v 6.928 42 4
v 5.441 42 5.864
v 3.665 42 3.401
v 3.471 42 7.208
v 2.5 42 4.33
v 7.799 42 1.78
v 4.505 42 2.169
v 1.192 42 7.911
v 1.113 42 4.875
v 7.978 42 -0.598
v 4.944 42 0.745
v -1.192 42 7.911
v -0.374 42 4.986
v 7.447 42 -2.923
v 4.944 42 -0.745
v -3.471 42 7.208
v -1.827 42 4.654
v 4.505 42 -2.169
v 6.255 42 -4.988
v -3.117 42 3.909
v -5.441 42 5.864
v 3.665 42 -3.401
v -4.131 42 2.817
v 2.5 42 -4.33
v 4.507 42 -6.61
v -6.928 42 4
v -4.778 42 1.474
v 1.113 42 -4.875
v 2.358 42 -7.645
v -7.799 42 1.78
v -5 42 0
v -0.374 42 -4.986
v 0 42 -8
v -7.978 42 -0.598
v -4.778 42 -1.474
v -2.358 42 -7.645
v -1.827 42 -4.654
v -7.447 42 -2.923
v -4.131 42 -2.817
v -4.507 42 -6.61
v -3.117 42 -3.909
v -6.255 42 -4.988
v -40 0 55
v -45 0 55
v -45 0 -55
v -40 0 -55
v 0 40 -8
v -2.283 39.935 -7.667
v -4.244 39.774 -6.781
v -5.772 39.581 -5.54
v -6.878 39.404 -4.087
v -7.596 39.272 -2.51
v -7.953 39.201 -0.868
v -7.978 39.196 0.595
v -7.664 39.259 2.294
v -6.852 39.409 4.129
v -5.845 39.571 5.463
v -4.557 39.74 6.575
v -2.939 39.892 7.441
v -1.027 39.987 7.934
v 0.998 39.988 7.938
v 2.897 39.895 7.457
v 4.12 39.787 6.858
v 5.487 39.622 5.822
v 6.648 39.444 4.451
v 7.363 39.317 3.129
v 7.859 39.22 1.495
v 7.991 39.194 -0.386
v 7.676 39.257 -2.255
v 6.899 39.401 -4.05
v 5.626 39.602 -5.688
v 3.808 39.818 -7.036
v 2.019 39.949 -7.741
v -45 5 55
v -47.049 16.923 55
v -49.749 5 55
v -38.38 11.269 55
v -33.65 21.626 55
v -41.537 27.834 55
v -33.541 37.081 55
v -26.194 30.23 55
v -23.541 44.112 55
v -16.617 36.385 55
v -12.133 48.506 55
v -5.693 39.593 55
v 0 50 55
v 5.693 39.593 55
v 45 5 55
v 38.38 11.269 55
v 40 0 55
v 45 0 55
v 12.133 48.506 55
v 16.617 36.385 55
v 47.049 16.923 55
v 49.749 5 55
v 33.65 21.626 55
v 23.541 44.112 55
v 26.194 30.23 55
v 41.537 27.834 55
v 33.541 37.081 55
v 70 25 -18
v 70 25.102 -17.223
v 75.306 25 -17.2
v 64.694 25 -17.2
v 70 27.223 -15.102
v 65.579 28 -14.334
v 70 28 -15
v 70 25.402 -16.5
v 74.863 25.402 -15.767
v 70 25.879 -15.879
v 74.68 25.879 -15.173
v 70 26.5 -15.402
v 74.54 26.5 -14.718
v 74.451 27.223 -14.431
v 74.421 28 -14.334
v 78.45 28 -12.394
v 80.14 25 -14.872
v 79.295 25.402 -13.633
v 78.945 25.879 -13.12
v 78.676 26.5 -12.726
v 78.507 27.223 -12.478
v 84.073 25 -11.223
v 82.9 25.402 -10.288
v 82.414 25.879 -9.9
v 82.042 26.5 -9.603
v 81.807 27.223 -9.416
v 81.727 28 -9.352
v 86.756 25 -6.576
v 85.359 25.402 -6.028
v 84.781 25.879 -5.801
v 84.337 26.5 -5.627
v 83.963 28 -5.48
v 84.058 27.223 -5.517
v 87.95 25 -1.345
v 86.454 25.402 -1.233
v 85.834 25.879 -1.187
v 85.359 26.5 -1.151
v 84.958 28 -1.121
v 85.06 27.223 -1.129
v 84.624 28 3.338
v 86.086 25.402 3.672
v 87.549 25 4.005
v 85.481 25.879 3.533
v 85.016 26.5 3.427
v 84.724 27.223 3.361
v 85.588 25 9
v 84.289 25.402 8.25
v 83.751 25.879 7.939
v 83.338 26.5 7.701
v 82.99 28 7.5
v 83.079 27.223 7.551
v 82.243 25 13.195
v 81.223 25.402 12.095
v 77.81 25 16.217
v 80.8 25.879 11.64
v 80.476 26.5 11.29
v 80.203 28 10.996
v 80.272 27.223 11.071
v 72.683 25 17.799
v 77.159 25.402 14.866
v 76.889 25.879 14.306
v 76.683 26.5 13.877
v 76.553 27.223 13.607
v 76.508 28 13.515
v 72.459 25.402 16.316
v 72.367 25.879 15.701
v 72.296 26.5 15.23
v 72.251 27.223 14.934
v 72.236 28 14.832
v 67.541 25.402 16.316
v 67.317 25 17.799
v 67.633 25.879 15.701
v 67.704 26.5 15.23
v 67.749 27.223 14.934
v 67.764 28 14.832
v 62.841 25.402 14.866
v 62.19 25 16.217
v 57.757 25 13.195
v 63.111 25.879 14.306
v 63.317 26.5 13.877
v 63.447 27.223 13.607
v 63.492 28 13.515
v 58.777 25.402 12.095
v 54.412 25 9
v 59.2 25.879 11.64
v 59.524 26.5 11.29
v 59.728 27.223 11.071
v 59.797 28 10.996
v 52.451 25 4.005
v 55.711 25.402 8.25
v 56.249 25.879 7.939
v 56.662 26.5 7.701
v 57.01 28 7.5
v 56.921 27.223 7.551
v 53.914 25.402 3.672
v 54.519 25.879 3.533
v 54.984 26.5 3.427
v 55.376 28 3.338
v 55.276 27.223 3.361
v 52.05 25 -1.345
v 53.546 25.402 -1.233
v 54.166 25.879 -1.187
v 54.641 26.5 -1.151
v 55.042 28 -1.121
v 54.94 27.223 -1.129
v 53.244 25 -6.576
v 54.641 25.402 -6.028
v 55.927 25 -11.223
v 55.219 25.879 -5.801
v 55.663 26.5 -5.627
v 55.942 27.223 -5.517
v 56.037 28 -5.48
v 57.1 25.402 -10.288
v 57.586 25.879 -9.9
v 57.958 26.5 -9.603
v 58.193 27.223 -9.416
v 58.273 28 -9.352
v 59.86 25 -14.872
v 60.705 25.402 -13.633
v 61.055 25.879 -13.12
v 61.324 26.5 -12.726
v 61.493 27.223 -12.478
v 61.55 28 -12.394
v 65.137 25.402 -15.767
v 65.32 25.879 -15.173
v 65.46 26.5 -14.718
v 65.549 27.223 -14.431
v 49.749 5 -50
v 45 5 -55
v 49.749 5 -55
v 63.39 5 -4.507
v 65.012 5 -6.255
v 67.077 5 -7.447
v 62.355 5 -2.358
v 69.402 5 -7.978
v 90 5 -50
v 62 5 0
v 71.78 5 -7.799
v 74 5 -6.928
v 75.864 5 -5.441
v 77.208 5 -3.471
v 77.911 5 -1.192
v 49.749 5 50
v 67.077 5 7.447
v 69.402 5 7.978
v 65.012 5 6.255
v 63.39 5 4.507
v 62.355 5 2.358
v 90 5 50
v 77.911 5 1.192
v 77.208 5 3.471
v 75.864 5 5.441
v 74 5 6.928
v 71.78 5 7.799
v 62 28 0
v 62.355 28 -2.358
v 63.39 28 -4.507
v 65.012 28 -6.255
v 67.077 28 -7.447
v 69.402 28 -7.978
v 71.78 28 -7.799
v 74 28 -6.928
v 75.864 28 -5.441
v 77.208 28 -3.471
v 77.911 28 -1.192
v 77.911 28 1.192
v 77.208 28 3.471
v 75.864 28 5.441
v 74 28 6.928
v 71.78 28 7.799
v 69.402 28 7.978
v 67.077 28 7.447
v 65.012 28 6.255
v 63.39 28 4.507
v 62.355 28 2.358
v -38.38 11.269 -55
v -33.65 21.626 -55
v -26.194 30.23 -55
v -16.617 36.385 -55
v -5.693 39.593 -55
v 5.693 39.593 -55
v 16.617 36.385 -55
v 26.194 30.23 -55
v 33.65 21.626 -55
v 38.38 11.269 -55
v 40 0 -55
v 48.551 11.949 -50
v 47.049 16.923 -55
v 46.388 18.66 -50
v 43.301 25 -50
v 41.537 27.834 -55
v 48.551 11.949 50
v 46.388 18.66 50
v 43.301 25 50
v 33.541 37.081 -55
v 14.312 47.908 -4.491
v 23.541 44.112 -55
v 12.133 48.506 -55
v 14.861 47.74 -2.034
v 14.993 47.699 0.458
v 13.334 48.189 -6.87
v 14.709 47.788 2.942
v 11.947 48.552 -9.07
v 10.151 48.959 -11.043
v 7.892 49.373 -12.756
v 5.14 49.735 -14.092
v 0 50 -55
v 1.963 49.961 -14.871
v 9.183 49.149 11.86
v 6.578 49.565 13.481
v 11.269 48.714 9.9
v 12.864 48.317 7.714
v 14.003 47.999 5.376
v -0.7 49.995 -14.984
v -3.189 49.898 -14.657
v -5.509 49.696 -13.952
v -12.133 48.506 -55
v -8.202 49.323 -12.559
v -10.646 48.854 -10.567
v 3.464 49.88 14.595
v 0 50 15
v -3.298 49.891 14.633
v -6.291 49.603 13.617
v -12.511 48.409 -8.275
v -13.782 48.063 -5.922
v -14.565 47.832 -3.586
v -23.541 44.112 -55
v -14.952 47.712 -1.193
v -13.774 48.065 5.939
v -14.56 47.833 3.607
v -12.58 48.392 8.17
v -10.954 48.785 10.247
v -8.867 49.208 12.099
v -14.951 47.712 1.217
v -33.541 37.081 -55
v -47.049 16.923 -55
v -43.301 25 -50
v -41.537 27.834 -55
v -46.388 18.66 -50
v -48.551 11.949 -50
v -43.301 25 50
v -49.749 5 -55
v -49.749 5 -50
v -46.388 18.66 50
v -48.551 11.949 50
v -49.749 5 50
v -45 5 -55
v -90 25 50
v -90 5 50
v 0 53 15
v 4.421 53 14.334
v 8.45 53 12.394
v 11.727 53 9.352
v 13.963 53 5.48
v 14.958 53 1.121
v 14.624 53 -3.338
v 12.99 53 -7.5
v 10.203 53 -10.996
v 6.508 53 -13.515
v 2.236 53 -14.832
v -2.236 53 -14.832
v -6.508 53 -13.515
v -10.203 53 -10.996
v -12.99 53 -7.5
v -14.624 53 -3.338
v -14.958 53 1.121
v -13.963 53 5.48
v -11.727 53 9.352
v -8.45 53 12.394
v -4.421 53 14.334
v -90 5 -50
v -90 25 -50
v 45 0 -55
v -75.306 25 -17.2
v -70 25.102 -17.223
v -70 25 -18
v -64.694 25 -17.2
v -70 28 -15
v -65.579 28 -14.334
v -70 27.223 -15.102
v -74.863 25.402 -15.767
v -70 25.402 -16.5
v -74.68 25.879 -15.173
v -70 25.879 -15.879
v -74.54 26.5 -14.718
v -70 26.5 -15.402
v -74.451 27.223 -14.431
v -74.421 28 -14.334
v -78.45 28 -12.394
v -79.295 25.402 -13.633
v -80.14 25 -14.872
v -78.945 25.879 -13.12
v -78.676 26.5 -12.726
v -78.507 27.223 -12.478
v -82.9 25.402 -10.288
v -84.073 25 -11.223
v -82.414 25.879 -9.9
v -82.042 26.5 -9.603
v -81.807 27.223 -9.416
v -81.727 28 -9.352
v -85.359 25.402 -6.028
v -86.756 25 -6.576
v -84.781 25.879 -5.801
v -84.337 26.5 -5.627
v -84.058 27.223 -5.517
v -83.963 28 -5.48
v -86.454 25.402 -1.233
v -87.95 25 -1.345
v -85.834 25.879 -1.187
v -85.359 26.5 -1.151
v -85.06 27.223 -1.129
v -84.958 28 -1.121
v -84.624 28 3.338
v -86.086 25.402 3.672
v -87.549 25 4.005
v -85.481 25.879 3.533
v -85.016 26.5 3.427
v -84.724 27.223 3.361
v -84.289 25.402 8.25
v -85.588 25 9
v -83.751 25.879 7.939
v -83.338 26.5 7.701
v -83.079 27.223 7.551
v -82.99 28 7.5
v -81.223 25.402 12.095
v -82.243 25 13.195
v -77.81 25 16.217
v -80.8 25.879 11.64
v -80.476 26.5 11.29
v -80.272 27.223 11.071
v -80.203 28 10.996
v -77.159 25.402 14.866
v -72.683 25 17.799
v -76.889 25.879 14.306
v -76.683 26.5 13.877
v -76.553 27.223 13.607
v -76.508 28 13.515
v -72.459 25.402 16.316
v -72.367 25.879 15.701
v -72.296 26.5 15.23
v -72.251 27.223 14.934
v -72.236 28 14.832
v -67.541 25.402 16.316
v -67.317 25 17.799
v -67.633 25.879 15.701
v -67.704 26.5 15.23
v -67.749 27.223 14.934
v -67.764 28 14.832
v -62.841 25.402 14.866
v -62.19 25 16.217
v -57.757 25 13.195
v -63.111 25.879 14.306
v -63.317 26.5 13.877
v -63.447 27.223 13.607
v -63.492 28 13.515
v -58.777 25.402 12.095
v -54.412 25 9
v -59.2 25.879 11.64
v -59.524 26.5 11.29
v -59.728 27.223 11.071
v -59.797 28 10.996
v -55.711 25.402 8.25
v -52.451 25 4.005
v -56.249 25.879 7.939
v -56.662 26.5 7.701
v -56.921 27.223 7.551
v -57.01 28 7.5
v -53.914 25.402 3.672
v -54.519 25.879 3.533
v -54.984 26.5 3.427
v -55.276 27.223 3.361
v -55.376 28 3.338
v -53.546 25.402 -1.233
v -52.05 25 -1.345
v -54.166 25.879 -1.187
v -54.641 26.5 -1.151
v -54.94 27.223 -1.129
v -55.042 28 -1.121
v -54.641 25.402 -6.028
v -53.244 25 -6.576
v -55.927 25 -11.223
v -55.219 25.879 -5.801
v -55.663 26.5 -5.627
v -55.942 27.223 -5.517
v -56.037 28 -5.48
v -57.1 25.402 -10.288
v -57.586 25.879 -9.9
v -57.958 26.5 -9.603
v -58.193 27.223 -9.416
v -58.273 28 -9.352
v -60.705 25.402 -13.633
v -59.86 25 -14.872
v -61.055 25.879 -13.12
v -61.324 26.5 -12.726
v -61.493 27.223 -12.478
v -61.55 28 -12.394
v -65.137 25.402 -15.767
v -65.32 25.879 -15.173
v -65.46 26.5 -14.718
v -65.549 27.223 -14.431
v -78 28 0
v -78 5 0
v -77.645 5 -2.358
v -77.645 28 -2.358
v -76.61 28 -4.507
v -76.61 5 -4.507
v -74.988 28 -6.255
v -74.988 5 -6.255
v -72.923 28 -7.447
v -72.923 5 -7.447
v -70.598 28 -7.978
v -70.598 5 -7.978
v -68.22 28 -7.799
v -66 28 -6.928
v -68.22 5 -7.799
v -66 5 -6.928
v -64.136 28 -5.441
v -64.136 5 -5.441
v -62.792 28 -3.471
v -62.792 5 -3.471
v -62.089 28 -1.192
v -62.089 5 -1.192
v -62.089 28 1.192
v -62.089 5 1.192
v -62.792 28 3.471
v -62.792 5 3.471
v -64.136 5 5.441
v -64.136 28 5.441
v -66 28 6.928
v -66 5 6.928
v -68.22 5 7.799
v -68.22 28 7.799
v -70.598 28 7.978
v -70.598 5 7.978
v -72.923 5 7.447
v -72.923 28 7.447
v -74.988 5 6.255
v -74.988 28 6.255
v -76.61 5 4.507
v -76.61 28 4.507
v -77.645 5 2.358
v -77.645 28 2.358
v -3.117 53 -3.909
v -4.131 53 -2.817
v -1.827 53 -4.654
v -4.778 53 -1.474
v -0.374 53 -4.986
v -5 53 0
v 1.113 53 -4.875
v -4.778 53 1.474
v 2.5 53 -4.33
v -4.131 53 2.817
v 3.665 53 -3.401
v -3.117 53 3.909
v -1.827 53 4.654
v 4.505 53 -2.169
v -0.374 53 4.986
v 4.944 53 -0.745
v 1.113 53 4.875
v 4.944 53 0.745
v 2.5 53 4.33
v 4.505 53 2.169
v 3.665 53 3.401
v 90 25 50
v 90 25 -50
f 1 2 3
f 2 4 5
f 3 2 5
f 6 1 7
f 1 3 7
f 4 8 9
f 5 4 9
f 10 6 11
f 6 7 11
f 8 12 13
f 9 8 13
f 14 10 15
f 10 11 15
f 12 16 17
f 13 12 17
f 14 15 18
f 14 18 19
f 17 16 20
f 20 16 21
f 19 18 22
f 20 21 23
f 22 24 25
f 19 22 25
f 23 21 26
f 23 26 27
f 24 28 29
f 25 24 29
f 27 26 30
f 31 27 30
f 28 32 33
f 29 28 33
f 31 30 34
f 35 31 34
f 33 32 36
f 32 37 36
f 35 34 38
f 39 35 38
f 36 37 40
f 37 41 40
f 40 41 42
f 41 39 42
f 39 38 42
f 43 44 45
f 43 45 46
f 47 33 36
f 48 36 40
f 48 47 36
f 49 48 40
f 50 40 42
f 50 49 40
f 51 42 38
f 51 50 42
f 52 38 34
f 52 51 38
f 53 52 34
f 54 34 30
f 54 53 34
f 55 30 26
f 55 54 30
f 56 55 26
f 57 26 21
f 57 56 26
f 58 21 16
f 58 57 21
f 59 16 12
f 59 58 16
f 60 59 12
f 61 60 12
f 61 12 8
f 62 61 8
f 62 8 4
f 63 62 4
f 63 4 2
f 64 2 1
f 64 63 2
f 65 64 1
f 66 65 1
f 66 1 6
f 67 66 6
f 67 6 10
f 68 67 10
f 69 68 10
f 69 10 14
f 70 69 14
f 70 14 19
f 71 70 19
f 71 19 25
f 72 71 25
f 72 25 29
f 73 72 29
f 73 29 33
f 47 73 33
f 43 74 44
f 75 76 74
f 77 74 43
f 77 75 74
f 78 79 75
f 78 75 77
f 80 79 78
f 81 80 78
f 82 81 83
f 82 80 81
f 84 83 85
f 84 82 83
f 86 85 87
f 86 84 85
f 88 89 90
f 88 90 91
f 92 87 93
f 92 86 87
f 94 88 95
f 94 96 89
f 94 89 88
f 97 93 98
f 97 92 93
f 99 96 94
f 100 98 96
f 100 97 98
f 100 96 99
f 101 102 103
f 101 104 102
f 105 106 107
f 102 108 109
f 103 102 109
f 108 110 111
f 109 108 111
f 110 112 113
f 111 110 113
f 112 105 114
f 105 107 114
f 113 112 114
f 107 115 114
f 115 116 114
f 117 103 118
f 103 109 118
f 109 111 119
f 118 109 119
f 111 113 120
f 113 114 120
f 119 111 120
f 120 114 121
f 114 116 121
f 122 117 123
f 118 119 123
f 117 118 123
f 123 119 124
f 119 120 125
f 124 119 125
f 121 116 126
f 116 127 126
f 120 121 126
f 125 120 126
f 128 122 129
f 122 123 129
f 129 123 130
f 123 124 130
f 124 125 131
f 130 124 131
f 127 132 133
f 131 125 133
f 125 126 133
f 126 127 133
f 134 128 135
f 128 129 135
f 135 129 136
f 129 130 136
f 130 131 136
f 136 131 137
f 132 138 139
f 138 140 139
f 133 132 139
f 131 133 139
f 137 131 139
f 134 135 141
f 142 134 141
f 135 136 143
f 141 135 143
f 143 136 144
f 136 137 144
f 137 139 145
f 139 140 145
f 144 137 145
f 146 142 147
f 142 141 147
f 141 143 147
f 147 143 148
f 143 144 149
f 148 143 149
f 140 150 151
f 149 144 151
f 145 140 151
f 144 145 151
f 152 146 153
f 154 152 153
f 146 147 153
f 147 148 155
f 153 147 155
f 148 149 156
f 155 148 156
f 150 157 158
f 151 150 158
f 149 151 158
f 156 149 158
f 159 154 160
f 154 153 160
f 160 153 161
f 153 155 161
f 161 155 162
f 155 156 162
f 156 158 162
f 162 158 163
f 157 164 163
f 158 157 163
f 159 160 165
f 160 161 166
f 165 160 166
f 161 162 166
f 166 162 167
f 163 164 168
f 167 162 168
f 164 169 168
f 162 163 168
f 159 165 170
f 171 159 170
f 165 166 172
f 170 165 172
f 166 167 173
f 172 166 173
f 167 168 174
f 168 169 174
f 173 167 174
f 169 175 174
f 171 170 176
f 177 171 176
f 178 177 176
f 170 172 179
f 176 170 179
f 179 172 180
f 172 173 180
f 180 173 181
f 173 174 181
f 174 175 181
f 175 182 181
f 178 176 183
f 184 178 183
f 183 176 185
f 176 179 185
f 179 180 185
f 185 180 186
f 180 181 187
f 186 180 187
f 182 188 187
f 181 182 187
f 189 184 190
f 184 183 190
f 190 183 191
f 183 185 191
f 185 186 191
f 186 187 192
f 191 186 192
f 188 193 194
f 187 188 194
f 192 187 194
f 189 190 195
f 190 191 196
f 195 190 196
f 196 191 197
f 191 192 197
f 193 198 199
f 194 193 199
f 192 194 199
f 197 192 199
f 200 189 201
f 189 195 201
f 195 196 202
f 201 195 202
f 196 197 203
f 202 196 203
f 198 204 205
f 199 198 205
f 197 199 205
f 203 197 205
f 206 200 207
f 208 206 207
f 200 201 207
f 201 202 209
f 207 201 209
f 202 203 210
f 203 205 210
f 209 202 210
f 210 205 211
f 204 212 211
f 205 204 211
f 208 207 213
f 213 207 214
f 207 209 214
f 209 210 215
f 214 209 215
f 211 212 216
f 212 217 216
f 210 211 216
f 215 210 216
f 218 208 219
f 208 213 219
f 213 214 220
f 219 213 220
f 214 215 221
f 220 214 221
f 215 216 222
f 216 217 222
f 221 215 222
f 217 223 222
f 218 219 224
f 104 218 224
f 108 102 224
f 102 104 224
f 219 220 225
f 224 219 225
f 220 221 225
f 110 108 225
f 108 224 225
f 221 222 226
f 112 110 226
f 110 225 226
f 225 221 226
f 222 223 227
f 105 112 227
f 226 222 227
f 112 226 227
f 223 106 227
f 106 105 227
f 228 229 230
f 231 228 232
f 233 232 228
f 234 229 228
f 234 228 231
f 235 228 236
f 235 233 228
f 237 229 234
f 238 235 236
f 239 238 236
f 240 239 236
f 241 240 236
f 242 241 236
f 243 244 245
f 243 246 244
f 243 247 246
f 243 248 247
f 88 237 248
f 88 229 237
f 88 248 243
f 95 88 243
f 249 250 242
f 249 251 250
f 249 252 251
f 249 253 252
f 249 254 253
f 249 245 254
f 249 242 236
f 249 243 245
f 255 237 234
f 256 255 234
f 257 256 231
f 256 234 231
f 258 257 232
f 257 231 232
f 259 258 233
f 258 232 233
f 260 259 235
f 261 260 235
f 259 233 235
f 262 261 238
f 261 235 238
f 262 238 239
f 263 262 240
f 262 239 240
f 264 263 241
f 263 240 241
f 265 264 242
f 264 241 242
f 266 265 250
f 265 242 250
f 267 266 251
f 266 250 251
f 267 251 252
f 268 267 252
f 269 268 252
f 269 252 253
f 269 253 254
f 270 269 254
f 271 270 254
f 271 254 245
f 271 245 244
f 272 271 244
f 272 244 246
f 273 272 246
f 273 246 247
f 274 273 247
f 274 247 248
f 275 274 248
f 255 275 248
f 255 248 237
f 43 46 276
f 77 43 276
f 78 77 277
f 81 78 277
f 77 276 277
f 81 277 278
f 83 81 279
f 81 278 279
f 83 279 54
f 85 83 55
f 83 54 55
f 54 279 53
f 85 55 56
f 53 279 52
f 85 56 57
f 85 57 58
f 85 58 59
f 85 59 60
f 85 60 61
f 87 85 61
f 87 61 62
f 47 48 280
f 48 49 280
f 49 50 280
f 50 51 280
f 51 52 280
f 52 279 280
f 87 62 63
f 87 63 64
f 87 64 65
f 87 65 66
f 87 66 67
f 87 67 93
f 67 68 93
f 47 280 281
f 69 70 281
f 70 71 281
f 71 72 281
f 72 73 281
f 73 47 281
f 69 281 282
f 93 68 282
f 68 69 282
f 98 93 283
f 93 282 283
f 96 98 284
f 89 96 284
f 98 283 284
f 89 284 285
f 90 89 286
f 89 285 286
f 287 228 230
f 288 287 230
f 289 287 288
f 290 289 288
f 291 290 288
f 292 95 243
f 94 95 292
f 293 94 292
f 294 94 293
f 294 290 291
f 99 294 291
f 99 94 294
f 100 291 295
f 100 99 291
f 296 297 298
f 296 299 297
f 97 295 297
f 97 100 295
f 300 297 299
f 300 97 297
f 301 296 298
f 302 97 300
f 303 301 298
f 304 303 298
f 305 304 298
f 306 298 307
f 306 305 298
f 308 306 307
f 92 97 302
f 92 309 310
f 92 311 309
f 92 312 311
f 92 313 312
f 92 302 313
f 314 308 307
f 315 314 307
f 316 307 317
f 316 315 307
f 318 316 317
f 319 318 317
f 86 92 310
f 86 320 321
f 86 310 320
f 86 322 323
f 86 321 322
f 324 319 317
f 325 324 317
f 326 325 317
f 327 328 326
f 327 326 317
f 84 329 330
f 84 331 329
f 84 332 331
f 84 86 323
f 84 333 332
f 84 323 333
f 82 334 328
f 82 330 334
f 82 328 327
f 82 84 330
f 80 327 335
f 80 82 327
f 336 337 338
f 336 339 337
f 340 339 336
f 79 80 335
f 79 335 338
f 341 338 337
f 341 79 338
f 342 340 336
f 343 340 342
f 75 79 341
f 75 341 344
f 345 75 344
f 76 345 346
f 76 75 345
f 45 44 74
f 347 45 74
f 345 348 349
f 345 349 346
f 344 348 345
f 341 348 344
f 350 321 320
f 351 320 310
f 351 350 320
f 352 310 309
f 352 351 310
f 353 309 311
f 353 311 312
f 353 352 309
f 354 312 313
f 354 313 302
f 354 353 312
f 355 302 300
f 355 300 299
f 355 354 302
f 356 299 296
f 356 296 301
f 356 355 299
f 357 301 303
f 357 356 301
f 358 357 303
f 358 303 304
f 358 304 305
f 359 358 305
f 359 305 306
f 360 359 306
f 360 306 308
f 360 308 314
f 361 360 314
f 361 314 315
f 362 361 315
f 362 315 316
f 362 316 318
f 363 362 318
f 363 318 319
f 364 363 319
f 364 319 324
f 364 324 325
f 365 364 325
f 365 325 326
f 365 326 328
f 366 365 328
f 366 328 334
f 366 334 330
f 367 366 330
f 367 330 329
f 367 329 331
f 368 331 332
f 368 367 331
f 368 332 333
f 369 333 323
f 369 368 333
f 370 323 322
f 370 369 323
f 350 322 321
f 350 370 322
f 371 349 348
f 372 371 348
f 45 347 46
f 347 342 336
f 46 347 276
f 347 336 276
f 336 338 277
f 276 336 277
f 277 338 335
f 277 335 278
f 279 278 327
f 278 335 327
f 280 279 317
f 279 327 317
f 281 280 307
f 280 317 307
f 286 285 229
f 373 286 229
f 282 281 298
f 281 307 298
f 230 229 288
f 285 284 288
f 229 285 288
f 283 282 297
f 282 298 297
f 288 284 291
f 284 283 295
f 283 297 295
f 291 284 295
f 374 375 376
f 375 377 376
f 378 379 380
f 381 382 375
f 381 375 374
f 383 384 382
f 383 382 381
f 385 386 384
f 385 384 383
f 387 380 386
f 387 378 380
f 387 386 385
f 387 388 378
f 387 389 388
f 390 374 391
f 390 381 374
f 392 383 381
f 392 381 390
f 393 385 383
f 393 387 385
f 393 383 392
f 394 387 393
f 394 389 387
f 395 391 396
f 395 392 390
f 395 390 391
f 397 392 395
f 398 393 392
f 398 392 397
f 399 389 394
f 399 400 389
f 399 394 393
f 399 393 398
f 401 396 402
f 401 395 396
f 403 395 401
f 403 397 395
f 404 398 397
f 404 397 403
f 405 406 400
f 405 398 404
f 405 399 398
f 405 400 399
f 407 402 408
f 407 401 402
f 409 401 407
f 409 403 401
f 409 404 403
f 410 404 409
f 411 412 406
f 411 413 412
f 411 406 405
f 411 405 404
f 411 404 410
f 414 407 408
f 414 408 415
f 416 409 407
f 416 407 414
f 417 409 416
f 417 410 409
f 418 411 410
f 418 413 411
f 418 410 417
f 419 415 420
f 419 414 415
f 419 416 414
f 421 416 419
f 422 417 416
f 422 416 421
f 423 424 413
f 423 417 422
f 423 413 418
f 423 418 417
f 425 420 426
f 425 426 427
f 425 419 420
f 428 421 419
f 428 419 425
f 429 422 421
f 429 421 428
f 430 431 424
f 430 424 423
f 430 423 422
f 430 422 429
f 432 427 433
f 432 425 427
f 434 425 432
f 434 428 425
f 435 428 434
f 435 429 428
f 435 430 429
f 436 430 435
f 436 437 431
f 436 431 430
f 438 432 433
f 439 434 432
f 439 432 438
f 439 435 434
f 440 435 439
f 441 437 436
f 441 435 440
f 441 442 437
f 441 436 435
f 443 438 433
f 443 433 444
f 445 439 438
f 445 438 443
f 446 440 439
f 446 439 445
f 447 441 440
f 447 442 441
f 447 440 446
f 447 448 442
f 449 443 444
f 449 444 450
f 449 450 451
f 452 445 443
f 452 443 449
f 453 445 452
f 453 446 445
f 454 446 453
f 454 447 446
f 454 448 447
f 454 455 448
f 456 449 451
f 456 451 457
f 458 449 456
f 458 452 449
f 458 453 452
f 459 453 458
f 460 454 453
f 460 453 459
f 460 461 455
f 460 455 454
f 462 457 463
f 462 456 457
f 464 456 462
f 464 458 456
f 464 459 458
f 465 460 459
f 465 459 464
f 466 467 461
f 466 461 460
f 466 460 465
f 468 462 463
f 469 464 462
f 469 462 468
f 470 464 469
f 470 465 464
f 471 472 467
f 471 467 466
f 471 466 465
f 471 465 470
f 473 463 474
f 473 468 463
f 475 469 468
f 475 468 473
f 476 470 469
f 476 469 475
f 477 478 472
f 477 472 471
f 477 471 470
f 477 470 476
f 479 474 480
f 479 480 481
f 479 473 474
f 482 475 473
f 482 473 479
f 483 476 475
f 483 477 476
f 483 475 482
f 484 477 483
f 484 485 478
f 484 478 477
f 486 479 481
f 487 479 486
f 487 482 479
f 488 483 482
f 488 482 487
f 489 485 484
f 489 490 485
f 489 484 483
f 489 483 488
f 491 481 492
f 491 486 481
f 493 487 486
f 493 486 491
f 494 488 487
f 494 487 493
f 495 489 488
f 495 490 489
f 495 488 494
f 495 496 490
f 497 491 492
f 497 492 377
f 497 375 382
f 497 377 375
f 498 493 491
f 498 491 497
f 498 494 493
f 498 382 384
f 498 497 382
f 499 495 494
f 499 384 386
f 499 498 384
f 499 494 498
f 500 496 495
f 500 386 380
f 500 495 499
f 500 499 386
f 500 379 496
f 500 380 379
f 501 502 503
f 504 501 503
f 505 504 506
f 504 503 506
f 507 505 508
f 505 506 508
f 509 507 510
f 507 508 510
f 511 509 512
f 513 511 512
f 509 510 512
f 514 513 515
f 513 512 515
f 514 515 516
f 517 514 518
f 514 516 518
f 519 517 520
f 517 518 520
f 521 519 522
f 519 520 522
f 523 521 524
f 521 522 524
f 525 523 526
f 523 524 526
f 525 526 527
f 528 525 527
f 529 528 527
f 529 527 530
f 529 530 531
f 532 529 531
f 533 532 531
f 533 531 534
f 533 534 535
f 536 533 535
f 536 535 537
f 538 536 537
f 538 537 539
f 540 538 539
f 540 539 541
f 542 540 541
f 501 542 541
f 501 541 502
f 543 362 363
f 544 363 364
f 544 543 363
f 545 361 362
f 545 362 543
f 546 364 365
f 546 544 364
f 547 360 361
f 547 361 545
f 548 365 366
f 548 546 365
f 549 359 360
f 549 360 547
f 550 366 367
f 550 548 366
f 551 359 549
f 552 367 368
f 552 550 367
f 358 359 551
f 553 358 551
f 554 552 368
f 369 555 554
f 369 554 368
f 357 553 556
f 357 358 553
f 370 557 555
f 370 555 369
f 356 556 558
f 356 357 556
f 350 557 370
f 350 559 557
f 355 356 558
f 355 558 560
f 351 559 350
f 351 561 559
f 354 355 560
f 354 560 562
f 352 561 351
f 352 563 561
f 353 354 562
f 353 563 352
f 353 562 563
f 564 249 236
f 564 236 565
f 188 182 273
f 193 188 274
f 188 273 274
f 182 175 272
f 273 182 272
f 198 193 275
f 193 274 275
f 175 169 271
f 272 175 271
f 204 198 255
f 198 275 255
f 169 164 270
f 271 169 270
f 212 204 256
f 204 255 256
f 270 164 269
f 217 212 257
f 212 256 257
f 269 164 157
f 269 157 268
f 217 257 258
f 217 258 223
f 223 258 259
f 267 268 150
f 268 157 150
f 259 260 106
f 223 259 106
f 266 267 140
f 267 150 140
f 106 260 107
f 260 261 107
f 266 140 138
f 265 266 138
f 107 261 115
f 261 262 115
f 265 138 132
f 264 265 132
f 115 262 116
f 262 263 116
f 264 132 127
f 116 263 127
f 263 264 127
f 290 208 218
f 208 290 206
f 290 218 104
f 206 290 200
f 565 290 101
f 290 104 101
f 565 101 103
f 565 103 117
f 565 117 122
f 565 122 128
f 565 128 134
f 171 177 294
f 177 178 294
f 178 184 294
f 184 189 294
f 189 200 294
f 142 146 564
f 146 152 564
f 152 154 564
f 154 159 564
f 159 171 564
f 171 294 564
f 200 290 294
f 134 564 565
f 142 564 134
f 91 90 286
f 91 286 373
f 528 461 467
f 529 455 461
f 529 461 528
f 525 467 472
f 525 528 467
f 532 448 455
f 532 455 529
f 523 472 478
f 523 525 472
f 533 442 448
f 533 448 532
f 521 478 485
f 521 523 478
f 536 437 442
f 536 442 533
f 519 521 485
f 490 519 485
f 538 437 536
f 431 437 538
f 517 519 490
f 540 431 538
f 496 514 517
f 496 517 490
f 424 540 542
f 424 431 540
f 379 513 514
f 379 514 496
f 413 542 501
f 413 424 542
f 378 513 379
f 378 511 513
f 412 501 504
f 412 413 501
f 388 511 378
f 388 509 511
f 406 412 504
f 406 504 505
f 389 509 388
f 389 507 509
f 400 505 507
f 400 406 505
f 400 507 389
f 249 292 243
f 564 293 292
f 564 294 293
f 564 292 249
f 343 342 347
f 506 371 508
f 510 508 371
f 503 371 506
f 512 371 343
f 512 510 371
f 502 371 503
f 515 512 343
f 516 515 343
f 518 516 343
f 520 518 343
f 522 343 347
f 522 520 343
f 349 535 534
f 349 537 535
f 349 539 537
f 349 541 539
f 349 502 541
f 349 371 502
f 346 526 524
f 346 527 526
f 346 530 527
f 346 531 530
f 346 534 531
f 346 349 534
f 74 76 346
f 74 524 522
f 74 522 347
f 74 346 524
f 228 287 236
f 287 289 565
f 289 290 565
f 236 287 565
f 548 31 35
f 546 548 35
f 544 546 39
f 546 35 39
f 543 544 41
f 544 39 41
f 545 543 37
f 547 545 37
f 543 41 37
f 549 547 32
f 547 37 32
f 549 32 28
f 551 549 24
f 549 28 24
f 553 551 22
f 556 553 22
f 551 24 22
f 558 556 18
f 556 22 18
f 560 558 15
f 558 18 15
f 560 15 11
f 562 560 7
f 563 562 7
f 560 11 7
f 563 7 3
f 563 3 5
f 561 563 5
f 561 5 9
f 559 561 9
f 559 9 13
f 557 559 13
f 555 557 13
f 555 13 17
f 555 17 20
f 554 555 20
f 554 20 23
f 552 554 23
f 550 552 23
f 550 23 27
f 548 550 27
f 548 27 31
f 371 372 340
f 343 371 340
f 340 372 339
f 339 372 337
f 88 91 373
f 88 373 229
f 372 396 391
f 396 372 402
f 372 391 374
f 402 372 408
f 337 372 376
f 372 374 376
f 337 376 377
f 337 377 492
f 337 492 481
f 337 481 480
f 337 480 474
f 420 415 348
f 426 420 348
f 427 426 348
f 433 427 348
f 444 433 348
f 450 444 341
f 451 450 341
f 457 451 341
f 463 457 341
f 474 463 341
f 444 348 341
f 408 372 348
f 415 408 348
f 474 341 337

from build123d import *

# Parameters (mm, degrees)
BOSS_EXTRUDE1_DEPTH      = 55
SKETCH2_W                = 180
SKETCH2_H                = 20
BOSS_EXTRUDE2_DEPTH      = 50
SKETCH3_W                = 5
SKETCH3_H                = 5
CUT_EXTRUDE1_DEPTH       = 151.665191733
CUT_EXTRUDE2_DEPTH       = 151.665191733
CUT_EXTRUDE2_DEPTH_BACK  = 151.665191733
SKETCH5_R                = 15
BOSS_EXTRUDE3_DEPTH      = 3
BOSS_EXTRUDE4_REACH      = 120.042
BOSS_EXTRUDE4_END_RADIUS = 50
SKETCH6_R                = 15
HOLE1_D                  = 10
HOLE2_D                  = 16
FILLET1_R                = 3
SKETCH11_R               = 8
CUT_EXTRUDE3_DEPTH       = 42


with BuildPart() as part:
    # Sketch1 → Boss-Extrude1 (new, symmetric)
    with BuildSketch(Plane.XY):
        with BuildLine():
            Line((-50, 0), (50, 0))
            ThreePointArc((50, 0), (0, 50), (-50, 0))
        make_face()
    extrude(amount=BOSS_EXTRUDE1_DEPTH, both=True)

    # Sketch2 → Boss-Extrude2 (add, symmetric)
    with BuildSketch(Plane.XY):
        with Locations((0, 15)):
            Rectangle(SKETCH2_W, SKETCH2_H)
    extrude(amount=BOSS_EXTRUDE2_DEPTH, both=True)

    # Sketch3 → Cut-Extrude1 (cut, symmetric)
    with BuildSketch(Plane.XY.offset(55)):
        with Locations((47.5, 2.5)):
            Rectangle(SKETCH3_W, SKETCH3_H)
    cut_extrude1 = extrude(amount=CUT_EXTRUDE1_DEPTH, both=True, mode=Mode.SUBTRACT)

    # Mirror1: Cut-Extrude1 across plane
    add(cut_extrude1.mirror(Plane(origin=(0, 0, 0), x_dir=(0, 0, 1), z_dir=(1, 0, 0))), mode=Mode.SUBTRACT)

    # Sketch4 → Cut-Extrude2 (cut, two sides: drawn at the far end of the back side and taken through both)
    with BuildSketch(Plane.XY.offset(55).offset(-CUT_EXTRUDE2_DEPTH_BACK)):
        with BuildLine():
            Line((40, 0), (-40, 0))
            ThreePointArc((-40, 0), (0, 40), (40, 0))
        make_face()
    extrude(amount=CUT_EXTRUDE2_DEPTH + CUT_EXTRUDE2_DEPTH_BACK, mode=Mode.SUBTRACT)

    # Sketch5 → Boss-Extrude3 (add)
    with BuildSketch(Plane(origin=(0, 25, 0), x_dir=(1, 0, 0), z_dir=(0, 1, 0))):
        with Locations(Location((-70, 0, 0), (0, 0, 90))):
            Circle(SKETCH5_R)
    boss_extrude3 = extrude(amount=BOSS_EXTRUDE3_DEPTH)

    # Mirror2: Boss-Extrude3 across plane
    add(boss_extrude3.mirror(Plane(origin=(0, 0, 0), x_dir=(0, 0, 1), z_dir=(1, 0, 0))))

    # Boss-Extrude4: up to this cylinder (the profile starts outside it)
    boss_extrude4_end = Plane(origin=(0, 0, 0), z_dir=(0, 0, -1)) * Cylinder(BOSS_EXTRUDE4_END_RADIUS, 341.084, mode=Mode.PRIVATE)
    # Sketch6 → Boss-Extrude4 (add, up to the surface)
    with BuildSketch(Plane(origin=(0, 53, 0), x_dir=(1, 0, 0), z_dir=(0, 1, 0)), mode=Mode.PRIVATE) as boss_extrude4_sk1:
        with Locations(Location((0, 0, 0), (0, 0, 270))):
            Circle(SKETCH6_R)
    boss_extrude4_tool1 = extrude(boss_extrude4_sk1.sketch, amount=-BOSS_EXTRUDE4_REACH, mode=Mode.PRIVATE) - boss_extrude4_end
    add(boss_extrude4_tool1.solids().sort_by_distance((0, 53, 0))[0])

    # Hole1 (through all)
    with Locations(Plane(origin=(0, 53, 0), x_dir=(1, 0, 0), z_dir=(0, 1, 0))):
        with Locations((0, 0)):
            Hole(HOLE1_D / 2)

    # Hole2 (through all)
    with Locations(Plane(origin=(0, 28, 0), x_dir=(1, 0, 0), z_dir=(0, 1, 0))):
        with Locations((-70, 0), (70, 0)):
            Hole(HOLE2_D / 2)

    # Fillet1
    fillet1_edges = [part.edges().sort_by_distance(p)[0] for p in [
        (-70, 25, 15),
        (70, 25, 15),
    ]]
    fillet(fillet1_edges, radius=FILLET1_R - 0.0001)  # a hair under: the kernel refuses the full size

    # Sketch11 → Cut-Extrude3 (cut)
    with BuildSketch(Plane(origin=(0, 0, 0), x_dir=(1, 0, 0), z_dir=(0, 1, 0))):
        with Locations(Location((0, 0, 0), (0, 0, 90))):
            Circle(SKETCH11_R)
    extrude(amount=CUT_EXTRUDE3_DEPTH, mode=Mode.SUBTRACT)


solid = part.part
